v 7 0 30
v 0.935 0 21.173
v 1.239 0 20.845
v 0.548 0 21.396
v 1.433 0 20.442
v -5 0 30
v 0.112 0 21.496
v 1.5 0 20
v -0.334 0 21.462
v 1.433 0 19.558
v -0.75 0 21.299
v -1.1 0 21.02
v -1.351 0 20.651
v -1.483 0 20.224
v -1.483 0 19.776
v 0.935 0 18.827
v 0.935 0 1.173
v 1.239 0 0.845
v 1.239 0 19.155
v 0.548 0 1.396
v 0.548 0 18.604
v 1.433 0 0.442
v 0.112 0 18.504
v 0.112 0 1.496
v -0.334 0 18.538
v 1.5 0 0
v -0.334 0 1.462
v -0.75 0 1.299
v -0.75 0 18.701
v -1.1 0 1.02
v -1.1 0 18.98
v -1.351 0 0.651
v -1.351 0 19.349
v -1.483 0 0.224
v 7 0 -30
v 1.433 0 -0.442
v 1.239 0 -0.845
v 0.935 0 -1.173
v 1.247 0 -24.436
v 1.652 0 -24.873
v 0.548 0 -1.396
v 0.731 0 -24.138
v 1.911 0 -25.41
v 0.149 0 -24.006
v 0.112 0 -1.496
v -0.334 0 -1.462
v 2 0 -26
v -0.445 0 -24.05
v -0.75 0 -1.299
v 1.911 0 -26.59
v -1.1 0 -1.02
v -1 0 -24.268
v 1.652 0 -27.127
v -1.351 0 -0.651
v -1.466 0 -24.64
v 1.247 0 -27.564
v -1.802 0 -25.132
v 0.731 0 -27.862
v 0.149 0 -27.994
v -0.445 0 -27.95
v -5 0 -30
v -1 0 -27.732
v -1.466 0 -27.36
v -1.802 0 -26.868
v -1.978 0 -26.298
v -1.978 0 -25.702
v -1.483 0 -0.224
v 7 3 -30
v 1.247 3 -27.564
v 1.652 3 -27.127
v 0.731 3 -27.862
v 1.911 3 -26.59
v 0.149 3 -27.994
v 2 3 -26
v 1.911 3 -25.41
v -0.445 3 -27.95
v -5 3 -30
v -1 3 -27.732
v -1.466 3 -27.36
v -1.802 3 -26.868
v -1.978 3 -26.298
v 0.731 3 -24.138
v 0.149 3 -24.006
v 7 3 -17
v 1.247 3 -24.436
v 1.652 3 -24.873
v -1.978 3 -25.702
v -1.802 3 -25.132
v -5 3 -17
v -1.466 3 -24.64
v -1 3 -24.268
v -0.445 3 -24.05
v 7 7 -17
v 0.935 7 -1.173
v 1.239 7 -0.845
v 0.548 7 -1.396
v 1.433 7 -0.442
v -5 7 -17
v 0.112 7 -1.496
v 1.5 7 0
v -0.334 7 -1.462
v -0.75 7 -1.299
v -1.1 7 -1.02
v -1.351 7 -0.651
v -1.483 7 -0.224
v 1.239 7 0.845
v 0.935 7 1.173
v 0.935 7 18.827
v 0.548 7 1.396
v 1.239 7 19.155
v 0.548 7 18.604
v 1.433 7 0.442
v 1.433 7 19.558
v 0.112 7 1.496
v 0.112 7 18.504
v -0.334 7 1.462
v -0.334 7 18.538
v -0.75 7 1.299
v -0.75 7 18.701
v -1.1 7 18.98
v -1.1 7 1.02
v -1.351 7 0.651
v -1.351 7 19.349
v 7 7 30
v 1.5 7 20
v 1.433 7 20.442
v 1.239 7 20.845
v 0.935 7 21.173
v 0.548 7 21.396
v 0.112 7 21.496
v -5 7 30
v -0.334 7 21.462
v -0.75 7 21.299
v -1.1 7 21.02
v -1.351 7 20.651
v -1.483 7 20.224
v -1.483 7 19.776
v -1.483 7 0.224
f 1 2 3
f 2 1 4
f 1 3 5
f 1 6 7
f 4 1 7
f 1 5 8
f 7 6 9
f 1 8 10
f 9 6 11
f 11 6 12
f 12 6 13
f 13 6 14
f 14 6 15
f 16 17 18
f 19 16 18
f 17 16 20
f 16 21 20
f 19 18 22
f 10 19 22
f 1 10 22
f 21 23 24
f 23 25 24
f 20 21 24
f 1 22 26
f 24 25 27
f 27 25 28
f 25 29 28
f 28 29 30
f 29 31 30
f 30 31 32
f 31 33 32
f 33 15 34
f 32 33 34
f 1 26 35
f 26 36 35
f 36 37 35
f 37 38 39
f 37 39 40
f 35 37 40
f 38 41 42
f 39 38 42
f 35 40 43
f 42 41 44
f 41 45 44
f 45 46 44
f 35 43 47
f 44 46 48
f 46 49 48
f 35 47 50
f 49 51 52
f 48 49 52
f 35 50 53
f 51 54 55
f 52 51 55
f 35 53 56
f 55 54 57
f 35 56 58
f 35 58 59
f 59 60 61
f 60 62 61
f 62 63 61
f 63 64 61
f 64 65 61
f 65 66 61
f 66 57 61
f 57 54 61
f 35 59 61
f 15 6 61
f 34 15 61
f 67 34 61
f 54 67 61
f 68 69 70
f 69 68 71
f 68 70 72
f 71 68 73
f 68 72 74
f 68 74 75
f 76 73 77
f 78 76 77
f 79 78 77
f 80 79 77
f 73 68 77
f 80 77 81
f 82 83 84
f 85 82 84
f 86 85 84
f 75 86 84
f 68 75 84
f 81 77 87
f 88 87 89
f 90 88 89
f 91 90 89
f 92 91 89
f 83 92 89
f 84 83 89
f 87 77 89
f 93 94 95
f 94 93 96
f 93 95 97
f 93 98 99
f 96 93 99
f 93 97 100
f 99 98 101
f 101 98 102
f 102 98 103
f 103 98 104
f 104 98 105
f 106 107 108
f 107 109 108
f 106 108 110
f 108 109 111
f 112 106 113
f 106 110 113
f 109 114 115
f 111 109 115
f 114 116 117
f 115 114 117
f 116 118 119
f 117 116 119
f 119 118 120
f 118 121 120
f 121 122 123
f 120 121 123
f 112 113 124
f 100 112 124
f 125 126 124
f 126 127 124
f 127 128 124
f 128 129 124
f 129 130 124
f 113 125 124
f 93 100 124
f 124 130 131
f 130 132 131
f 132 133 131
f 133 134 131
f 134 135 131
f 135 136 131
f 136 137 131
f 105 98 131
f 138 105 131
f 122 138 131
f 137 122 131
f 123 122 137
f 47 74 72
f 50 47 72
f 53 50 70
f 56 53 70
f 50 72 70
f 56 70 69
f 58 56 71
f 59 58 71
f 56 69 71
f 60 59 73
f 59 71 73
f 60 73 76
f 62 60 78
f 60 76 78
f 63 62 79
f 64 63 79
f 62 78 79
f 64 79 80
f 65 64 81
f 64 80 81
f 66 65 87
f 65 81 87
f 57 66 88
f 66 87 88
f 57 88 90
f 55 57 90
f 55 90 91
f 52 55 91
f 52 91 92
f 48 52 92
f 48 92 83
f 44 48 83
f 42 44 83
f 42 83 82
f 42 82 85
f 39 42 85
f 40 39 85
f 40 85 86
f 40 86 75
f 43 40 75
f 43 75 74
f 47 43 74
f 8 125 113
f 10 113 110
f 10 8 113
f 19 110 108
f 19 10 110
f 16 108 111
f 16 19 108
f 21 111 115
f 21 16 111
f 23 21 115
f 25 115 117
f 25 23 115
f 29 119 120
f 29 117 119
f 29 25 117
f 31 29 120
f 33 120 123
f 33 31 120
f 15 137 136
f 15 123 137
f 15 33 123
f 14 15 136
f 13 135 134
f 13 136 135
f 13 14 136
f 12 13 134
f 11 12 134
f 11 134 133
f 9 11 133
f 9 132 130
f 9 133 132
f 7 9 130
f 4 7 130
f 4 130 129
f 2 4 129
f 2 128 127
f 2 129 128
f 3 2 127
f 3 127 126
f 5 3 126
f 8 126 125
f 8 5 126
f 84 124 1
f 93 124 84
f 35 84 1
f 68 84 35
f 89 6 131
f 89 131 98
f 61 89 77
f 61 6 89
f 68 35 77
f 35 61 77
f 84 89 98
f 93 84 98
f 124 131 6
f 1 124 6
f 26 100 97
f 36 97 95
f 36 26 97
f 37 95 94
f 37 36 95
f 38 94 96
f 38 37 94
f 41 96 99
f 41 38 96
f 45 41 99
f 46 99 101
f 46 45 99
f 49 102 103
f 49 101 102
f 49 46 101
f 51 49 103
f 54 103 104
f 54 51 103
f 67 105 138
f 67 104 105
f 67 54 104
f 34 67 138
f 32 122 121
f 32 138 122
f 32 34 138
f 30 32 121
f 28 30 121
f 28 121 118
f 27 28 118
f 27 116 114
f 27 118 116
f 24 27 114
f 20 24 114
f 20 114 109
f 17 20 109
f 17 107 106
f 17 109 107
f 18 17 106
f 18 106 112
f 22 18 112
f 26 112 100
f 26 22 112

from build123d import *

# Parameters (mm, degrees)
SKETCH1_W           = 10
SKETCH1_H           = 60
BOSS_EXTRUDE1_DEPTH = 7
SKETCH2_W           = 10
SKETCH2_H           = 13
CUT_EXTRUDE1_DEPTH  = 4
SKETCH3_R           = 2
CUT_EXTRUDE2_DEPTH  = 4
SKETCH4_R           = 1.5
CUT_EXTRUDE3_DEPTH  = 14
BOSS_EXTRUDE2_DEPTH = 2


with BuildPart() as part:
    # Sketch1 → Boss-Extrude1 (new body)
    with BuildSketch(Plane(origin=(0, 0, 0), x_dir=(1, 0, 0), z_dir=(0, 1, 0))):
        Rectangle(SKETCH1_W, SKETCH1_H)
    extrude(amount=BOSS_EXTRUDE1_DEPTH)

    # Sketch2 → Cut-Extrude1 (cut)
    with BuildSketch(Plane(origin=(0, 7, 0), x_dir=(1, 0, 0), z_dir=(0, 1, 0))):
        with Locations((0, 23.5)):
            Rectangle(SKETCH2_W, SKETCH2_H)
    extrude(amount=-CUT_EXTRUDE1_DEPTH, mode=Mode.SUBTRACT)

    # Sketch3 → Cut-Extrude2 (cut)
    with BuildSketch(Plane(origin=(0, 3, 0), x_dir=(1, 0, 0), z_dir=(0, 1, 0))):
        with Locations((0, 26)):
            Circle(SKETCH3_R)
    extrude(amount=-CUT_EXTRUDE2_DEPTH, mode=Mode.SUBTRACT)

    # Sketch4 → Cut-Extrude3 (cut)
    with BuildSketch(Plane(origin=(0, 0, 0), x_dir=(1, 0, 0), z_dir=(0, 1, 0))):
        Circle(SKETCH4_R)
        with Locations((0, -20)):
            Circle(SKETCH4_R)
    extrude(amount=CUT_EXTRUDE3_DEPTH, mode=Mode.SUBTRACT)

    # Sketch5 → Boss-Extrude2 (add)
    with BuildSketch(Plane(origin=(5, 0, 0), x_dir=(0, 0, -1), z_dir=(1, 0, 0))):
        Polygon((-30, 7), (-30, 0), (30, 0), (30, 3), (17, 3), (17, 7), align=None)
    extrude(amount=BOSS_EXTRUDE2_DEPTH)


solid = part.part
